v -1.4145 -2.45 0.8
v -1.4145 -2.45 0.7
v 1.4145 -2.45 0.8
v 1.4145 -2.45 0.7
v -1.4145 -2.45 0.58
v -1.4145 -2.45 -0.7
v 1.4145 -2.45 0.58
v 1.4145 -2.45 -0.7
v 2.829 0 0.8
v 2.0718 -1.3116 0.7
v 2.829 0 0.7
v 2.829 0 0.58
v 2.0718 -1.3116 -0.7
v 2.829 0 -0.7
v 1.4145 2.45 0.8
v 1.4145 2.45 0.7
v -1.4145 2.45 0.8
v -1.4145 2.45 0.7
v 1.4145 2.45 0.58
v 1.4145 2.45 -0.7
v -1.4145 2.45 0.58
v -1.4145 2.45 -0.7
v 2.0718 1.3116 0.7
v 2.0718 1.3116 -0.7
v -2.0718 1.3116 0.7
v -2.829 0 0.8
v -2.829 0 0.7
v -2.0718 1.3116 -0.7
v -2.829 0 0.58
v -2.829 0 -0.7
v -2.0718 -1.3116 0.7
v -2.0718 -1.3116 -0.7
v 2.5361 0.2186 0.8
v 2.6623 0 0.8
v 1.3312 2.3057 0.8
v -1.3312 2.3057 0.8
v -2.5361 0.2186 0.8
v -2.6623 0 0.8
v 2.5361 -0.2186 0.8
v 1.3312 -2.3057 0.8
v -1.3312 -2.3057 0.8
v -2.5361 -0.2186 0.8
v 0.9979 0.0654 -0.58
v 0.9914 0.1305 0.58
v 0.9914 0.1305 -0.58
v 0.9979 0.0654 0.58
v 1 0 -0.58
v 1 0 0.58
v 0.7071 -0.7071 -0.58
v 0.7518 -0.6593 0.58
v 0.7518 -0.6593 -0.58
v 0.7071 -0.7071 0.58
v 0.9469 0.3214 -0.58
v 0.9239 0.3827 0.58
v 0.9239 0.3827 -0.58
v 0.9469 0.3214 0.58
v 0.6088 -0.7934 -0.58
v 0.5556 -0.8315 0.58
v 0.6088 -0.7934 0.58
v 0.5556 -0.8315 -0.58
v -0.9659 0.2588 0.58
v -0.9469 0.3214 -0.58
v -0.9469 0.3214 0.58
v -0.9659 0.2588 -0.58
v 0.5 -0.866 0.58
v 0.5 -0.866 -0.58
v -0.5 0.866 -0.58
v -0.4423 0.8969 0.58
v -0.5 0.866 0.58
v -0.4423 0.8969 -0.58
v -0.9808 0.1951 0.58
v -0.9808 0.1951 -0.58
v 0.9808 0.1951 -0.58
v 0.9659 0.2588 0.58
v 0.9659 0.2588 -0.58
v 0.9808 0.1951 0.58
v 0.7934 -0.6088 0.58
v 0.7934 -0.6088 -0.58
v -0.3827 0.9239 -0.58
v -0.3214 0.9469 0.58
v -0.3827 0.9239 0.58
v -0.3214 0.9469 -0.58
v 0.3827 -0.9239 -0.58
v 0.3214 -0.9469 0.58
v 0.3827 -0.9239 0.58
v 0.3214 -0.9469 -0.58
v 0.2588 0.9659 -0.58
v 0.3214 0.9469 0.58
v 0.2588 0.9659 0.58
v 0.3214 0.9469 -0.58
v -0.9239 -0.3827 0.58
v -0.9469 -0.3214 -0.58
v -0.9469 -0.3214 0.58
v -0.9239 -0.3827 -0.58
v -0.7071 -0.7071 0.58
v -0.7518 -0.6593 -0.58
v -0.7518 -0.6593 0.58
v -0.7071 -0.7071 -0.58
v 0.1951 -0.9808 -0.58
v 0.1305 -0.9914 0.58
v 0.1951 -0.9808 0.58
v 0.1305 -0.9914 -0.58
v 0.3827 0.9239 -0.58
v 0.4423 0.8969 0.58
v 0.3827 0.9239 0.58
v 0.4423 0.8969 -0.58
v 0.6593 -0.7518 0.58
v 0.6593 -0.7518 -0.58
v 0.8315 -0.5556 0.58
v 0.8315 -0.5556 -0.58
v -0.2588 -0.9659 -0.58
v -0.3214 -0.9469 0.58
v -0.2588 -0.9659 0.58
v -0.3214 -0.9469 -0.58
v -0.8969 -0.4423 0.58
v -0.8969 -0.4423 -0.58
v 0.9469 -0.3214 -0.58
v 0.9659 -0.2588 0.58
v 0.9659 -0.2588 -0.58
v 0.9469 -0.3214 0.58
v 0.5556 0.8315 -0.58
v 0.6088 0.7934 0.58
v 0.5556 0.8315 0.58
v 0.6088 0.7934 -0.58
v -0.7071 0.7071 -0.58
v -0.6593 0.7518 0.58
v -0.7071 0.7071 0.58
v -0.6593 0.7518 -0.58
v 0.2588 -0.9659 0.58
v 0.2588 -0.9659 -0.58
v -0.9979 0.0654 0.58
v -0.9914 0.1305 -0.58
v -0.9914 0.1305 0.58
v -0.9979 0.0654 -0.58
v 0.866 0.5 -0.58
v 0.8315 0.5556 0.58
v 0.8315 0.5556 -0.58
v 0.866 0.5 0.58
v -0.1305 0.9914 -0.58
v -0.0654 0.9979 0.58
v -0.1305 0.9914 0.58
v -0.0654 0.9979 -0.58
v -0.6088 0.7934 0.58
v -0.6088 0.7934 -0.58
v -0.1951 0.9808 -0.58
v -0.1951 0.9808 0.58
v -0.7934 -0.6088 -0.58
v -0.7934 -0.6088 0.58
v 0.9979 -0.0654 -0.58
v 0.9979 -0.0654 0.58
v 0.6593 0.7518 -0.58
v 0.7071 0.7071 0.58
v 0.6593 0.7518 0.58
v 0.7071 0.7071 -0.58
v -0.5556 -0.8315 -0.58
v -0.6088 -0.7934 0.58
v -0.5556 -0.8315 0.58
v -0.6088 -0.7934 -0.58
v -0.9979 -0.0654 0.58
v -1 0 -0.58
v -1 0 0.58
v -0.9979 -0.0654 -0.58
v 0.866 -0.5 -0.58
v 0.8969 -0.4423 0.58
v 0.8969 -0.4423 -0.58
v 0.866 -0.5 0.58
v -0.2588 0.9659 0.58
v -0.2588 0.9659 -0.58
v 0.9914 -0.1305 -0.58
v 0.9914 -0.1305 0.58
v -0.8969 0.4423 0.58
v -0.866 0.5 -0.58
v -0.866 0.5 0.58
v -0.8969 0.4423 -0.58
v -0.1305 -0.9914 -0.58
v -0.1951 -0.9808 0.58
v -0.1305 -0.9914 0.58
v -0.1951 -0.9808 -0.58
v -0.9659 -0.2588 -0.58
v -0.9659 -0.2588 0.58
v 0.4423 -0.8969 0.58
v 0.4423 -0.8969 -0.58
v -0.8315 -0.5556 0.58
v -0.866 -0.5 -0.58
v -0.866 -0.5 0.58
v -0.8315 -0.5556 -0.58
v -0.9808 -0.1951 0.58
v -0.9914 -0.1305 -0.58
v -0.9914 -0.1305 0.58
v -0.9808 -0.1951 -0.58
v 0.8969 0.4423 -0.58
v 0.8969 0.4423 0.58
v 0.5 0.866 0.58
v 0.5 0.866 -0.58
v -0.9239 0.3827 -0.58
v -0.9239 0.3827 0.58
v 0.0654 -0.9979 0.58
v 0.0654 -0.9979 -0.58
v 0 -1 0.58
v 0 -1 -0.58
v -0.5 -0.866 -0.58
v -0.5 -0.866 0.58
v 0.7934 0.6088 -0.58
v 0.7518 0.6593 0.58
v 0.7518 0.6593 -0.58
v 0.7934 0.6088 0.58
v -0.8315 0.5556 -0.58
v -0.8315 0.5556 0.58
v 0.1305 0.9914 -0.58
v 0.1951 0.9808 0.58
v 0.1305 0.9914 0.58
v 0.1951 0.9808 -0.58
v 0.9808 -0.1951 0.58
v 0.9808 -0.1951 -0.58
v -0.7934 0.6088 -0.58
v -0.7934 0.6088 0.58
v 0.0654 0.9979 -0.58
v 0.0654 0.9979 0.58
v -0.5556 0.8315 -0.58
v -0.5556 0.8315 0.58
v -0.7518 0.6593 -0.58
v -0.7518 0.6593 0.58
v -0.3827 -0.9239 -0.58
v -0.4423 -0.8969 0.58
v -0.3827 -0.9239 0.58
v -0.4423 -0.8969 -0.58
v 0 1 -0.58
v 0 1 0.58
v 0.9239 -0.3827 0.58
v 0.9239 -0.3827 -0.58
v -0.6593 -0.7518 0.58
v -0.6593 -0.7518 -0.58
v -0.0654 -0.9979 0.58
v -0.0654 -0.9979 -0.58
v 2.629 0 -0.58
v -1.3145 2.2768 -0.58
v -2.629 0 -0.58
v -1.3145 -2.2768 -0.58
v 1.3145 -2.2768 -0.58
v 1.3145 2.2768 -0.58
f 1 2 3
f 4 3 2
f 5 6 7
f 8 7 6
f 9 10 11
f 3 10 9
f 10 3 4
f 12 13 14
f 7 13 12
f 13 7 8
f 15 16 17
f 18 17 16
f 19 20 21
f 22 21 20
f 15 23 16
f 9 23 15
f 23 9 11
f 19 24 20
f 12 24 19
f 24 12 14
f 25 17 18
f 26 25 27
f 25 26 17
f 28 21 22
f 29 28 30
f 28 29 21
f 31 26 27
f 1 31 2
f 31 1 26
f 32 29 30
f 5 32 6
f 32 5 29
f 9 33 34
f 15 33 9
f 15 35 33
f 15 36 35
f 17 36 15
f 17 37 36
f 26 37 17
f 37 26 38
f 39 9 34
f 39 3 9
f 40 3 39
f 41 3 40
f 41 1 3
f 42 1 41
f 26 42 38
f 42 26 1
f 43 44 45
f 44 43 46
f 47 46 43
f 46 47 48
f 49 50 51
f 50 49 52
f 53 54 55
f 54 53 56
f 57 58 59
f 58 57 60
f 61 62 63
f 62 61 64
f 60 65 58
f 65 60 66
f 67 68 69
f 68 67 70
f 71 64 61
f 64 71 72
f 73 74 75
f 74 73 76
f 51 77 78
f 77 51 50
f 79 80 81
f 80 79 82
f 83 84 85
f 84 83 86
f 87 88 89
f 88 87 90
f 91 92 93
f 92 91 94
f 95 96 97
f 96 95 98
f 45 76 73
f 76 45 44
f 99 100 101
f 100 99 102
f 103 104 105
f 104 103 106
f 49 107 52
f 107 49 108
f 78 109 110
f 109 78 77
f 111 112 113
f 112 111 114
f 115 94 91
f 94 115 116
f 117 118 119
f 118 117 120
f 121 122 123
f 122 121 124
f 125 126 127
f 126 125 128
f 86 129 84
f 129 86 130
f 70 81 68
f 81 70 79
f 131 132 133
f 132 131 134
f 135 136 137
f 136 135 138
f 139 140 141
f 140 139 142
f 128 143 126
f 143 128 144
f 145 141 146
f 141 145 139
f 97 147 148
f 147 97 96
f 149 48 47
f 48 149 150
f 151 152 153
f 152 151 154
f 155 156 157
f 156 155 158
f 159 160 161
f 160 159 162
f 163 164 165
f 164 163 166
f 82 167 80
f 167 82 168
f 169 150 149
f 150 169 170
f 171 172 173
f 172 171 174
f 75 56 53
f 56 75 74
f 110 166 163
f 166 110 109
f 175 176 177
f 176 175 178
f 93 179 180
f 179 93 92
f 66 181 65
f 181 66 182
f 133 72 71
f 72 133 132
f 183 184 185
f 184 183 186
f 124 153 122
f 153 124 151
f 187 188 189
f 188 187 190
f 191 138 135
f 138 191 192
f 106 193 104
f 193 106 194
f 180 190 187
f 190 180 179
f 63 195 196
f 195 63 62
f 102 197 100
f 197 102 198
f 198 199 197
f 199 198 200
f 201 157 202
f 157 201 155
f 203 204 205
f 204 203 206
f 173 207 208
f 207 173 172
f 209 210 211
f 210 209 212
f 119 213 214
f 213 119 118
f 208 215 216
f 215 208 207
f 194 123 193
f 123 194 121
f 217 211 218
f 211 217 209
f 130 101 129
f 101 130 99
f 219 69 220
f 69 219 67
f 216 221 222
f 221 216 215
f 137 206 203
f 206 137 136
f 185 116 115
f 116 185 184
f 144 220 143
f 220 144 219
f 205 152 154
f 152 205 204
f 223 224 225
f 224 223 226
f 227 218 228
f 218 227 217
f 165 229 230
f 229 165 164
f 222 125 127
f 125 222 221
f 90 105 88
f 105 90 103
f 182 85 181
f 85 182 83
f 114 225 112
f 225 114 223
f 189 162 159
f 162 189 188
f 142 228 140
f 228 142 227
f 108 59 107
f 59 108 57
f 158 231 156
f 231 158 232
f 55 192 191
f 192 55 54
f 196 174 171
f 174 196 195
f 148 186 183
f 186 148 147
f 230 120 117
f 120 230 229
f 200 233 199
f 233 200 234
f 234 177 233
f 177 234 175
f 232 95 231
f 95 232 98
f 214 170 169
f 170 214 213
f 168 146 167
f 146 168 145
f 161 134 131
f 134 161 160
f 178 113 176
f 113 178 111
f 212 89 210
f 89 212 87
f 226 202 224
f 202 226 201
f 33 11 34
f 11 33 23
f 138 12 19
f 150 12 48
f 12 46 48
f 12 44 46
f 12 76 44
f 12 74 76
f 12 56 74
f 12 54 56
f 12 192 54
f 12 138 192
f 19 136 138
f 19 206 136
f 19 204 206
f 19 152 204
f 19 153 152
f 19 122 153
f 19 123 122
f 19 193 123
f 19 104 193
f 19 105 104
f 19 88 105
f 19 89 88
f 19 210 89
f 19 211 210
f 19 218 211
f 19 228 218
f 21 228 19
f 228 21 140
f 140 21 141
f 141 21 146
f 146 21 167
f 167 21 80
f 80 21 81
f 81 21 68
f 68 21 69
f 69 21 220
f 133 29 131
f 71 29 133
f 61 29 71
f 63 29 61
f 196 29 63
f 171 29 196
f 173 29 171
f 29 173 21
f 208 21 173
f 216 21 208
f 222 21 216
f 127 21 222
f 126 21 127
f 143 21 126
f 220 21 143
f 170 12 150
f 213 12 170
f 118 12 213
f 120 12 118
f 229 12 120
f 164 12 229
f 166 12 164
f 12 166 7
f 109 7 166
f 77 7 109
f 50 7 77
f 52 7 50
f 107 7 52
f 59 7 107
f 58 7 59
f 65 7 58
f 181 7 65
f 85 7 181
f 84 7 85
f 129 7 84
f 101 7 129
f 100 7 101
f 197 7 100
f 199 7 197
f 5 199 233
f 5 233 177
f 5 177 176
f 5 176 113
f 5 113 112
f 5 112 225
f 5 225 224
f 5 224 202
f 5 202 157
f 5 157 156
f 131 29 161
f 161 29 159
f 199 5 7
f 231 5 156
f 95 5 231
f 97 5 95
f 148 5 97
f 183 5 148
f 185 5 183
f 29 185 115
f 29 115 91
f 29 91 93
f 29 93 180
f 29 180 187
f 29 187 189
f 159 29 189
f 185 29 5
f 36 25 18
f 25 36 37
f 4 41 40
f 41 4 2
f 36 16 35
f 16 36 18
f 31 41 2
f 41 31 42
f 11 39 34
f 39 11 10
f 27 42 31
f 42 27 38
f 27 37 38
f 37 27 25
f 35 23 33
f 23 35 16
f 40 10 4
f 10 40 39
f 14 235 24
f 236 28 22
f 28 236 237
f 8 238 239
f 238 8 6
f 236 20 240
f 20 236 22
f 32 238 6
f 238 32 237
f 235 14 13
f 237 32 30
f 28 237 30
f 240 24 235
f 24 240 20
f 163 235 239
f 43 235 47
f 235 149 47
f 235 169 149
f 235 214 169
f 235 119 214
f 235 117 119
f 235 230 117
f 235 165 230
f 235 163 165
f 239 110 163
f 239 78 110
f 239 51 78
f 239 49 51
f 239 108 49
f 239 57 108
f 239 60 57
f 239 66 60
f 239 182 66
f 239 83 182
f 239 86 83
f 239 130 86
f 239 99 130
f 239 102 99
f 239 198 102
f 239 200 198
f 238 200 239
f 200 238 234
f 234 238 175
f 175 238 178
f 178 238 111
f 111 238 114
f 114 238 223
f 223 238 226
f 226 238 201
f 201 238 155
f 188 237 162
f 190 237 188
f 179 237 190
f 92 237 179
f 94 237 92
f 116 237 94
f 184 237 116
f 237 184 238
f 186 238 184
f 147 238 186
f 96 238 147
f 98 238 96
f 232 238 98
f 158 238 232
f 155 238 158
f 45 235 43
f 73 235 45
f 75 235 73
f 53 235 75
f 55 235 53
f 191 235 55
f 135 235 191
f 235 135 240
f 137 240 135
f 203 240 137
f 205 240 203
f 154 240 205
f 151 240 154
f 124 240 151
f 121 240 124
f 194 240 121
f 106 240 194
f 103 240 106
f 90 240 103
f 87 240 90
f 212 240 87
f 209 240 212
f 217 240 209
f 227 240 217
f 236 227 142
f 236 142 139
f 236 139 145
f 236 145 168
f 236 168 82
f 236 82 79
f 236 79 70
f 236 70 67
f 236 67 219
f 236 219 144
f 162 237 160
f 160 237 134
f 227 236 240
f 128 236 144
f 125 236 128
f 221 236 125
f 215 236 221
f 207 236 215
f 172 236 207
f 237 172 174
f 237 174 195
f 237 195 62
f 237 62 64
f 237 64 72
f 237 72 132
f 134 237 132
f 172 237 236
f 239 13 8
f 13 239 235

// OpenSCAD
// Hex nut for 2.0mm screw
// Target: 4.9mm across flats, 1.6mm thick, through-hole 2.0mm

$fn = 96;

// Parameters
across_flats   = 4.9;   // mm
thickness      = 1.6;   // mm
hole_diameter  = 2.0;   // mm (clearance/through-hole)
chamfer        = 0.2;   // mm (edge bevel on top/bottom)
eps            = 0.02;  // mm (robust boolean overlap)

// Derived: circumradius (center to vertex) for a regular hex with given across-flats
hex_R = across_flats / sqrt(3);   // because across_flats = sqrt(3) * R

module hex_prism(h=thickness, R=hex_R) {
    cylinder(h=h, r=R, center=true, $fn=6);
}

module chamfer_cut(zsign=1) {
    // zsign = +1 for top, -1 for bottom
    // Use a conical frustum to remove material and create a bevel.
    // Place it so it intersects only the corresponding face.
    translate([0, 0, zsign*(thickness/2 - chamfer/2)])
        cylinder(
            h = chamfer + 2*eps,
            r1 = hex_R + chamfer,
            r2 = hex_R - chamfer,
            center = true,
            $fn = 6
        );
}

difference() {
    // Outer hex body with parallel top/bottom faces
    hex_prism();

    // Through-hole for screw
    cylinder(h=thickness + 2*eps, r=hole_diameter/2, center=true);

    // Top and bottom chamfers (subtractive)
    chamfer_cut(+1);
    chamfer_cut(-1);
}
